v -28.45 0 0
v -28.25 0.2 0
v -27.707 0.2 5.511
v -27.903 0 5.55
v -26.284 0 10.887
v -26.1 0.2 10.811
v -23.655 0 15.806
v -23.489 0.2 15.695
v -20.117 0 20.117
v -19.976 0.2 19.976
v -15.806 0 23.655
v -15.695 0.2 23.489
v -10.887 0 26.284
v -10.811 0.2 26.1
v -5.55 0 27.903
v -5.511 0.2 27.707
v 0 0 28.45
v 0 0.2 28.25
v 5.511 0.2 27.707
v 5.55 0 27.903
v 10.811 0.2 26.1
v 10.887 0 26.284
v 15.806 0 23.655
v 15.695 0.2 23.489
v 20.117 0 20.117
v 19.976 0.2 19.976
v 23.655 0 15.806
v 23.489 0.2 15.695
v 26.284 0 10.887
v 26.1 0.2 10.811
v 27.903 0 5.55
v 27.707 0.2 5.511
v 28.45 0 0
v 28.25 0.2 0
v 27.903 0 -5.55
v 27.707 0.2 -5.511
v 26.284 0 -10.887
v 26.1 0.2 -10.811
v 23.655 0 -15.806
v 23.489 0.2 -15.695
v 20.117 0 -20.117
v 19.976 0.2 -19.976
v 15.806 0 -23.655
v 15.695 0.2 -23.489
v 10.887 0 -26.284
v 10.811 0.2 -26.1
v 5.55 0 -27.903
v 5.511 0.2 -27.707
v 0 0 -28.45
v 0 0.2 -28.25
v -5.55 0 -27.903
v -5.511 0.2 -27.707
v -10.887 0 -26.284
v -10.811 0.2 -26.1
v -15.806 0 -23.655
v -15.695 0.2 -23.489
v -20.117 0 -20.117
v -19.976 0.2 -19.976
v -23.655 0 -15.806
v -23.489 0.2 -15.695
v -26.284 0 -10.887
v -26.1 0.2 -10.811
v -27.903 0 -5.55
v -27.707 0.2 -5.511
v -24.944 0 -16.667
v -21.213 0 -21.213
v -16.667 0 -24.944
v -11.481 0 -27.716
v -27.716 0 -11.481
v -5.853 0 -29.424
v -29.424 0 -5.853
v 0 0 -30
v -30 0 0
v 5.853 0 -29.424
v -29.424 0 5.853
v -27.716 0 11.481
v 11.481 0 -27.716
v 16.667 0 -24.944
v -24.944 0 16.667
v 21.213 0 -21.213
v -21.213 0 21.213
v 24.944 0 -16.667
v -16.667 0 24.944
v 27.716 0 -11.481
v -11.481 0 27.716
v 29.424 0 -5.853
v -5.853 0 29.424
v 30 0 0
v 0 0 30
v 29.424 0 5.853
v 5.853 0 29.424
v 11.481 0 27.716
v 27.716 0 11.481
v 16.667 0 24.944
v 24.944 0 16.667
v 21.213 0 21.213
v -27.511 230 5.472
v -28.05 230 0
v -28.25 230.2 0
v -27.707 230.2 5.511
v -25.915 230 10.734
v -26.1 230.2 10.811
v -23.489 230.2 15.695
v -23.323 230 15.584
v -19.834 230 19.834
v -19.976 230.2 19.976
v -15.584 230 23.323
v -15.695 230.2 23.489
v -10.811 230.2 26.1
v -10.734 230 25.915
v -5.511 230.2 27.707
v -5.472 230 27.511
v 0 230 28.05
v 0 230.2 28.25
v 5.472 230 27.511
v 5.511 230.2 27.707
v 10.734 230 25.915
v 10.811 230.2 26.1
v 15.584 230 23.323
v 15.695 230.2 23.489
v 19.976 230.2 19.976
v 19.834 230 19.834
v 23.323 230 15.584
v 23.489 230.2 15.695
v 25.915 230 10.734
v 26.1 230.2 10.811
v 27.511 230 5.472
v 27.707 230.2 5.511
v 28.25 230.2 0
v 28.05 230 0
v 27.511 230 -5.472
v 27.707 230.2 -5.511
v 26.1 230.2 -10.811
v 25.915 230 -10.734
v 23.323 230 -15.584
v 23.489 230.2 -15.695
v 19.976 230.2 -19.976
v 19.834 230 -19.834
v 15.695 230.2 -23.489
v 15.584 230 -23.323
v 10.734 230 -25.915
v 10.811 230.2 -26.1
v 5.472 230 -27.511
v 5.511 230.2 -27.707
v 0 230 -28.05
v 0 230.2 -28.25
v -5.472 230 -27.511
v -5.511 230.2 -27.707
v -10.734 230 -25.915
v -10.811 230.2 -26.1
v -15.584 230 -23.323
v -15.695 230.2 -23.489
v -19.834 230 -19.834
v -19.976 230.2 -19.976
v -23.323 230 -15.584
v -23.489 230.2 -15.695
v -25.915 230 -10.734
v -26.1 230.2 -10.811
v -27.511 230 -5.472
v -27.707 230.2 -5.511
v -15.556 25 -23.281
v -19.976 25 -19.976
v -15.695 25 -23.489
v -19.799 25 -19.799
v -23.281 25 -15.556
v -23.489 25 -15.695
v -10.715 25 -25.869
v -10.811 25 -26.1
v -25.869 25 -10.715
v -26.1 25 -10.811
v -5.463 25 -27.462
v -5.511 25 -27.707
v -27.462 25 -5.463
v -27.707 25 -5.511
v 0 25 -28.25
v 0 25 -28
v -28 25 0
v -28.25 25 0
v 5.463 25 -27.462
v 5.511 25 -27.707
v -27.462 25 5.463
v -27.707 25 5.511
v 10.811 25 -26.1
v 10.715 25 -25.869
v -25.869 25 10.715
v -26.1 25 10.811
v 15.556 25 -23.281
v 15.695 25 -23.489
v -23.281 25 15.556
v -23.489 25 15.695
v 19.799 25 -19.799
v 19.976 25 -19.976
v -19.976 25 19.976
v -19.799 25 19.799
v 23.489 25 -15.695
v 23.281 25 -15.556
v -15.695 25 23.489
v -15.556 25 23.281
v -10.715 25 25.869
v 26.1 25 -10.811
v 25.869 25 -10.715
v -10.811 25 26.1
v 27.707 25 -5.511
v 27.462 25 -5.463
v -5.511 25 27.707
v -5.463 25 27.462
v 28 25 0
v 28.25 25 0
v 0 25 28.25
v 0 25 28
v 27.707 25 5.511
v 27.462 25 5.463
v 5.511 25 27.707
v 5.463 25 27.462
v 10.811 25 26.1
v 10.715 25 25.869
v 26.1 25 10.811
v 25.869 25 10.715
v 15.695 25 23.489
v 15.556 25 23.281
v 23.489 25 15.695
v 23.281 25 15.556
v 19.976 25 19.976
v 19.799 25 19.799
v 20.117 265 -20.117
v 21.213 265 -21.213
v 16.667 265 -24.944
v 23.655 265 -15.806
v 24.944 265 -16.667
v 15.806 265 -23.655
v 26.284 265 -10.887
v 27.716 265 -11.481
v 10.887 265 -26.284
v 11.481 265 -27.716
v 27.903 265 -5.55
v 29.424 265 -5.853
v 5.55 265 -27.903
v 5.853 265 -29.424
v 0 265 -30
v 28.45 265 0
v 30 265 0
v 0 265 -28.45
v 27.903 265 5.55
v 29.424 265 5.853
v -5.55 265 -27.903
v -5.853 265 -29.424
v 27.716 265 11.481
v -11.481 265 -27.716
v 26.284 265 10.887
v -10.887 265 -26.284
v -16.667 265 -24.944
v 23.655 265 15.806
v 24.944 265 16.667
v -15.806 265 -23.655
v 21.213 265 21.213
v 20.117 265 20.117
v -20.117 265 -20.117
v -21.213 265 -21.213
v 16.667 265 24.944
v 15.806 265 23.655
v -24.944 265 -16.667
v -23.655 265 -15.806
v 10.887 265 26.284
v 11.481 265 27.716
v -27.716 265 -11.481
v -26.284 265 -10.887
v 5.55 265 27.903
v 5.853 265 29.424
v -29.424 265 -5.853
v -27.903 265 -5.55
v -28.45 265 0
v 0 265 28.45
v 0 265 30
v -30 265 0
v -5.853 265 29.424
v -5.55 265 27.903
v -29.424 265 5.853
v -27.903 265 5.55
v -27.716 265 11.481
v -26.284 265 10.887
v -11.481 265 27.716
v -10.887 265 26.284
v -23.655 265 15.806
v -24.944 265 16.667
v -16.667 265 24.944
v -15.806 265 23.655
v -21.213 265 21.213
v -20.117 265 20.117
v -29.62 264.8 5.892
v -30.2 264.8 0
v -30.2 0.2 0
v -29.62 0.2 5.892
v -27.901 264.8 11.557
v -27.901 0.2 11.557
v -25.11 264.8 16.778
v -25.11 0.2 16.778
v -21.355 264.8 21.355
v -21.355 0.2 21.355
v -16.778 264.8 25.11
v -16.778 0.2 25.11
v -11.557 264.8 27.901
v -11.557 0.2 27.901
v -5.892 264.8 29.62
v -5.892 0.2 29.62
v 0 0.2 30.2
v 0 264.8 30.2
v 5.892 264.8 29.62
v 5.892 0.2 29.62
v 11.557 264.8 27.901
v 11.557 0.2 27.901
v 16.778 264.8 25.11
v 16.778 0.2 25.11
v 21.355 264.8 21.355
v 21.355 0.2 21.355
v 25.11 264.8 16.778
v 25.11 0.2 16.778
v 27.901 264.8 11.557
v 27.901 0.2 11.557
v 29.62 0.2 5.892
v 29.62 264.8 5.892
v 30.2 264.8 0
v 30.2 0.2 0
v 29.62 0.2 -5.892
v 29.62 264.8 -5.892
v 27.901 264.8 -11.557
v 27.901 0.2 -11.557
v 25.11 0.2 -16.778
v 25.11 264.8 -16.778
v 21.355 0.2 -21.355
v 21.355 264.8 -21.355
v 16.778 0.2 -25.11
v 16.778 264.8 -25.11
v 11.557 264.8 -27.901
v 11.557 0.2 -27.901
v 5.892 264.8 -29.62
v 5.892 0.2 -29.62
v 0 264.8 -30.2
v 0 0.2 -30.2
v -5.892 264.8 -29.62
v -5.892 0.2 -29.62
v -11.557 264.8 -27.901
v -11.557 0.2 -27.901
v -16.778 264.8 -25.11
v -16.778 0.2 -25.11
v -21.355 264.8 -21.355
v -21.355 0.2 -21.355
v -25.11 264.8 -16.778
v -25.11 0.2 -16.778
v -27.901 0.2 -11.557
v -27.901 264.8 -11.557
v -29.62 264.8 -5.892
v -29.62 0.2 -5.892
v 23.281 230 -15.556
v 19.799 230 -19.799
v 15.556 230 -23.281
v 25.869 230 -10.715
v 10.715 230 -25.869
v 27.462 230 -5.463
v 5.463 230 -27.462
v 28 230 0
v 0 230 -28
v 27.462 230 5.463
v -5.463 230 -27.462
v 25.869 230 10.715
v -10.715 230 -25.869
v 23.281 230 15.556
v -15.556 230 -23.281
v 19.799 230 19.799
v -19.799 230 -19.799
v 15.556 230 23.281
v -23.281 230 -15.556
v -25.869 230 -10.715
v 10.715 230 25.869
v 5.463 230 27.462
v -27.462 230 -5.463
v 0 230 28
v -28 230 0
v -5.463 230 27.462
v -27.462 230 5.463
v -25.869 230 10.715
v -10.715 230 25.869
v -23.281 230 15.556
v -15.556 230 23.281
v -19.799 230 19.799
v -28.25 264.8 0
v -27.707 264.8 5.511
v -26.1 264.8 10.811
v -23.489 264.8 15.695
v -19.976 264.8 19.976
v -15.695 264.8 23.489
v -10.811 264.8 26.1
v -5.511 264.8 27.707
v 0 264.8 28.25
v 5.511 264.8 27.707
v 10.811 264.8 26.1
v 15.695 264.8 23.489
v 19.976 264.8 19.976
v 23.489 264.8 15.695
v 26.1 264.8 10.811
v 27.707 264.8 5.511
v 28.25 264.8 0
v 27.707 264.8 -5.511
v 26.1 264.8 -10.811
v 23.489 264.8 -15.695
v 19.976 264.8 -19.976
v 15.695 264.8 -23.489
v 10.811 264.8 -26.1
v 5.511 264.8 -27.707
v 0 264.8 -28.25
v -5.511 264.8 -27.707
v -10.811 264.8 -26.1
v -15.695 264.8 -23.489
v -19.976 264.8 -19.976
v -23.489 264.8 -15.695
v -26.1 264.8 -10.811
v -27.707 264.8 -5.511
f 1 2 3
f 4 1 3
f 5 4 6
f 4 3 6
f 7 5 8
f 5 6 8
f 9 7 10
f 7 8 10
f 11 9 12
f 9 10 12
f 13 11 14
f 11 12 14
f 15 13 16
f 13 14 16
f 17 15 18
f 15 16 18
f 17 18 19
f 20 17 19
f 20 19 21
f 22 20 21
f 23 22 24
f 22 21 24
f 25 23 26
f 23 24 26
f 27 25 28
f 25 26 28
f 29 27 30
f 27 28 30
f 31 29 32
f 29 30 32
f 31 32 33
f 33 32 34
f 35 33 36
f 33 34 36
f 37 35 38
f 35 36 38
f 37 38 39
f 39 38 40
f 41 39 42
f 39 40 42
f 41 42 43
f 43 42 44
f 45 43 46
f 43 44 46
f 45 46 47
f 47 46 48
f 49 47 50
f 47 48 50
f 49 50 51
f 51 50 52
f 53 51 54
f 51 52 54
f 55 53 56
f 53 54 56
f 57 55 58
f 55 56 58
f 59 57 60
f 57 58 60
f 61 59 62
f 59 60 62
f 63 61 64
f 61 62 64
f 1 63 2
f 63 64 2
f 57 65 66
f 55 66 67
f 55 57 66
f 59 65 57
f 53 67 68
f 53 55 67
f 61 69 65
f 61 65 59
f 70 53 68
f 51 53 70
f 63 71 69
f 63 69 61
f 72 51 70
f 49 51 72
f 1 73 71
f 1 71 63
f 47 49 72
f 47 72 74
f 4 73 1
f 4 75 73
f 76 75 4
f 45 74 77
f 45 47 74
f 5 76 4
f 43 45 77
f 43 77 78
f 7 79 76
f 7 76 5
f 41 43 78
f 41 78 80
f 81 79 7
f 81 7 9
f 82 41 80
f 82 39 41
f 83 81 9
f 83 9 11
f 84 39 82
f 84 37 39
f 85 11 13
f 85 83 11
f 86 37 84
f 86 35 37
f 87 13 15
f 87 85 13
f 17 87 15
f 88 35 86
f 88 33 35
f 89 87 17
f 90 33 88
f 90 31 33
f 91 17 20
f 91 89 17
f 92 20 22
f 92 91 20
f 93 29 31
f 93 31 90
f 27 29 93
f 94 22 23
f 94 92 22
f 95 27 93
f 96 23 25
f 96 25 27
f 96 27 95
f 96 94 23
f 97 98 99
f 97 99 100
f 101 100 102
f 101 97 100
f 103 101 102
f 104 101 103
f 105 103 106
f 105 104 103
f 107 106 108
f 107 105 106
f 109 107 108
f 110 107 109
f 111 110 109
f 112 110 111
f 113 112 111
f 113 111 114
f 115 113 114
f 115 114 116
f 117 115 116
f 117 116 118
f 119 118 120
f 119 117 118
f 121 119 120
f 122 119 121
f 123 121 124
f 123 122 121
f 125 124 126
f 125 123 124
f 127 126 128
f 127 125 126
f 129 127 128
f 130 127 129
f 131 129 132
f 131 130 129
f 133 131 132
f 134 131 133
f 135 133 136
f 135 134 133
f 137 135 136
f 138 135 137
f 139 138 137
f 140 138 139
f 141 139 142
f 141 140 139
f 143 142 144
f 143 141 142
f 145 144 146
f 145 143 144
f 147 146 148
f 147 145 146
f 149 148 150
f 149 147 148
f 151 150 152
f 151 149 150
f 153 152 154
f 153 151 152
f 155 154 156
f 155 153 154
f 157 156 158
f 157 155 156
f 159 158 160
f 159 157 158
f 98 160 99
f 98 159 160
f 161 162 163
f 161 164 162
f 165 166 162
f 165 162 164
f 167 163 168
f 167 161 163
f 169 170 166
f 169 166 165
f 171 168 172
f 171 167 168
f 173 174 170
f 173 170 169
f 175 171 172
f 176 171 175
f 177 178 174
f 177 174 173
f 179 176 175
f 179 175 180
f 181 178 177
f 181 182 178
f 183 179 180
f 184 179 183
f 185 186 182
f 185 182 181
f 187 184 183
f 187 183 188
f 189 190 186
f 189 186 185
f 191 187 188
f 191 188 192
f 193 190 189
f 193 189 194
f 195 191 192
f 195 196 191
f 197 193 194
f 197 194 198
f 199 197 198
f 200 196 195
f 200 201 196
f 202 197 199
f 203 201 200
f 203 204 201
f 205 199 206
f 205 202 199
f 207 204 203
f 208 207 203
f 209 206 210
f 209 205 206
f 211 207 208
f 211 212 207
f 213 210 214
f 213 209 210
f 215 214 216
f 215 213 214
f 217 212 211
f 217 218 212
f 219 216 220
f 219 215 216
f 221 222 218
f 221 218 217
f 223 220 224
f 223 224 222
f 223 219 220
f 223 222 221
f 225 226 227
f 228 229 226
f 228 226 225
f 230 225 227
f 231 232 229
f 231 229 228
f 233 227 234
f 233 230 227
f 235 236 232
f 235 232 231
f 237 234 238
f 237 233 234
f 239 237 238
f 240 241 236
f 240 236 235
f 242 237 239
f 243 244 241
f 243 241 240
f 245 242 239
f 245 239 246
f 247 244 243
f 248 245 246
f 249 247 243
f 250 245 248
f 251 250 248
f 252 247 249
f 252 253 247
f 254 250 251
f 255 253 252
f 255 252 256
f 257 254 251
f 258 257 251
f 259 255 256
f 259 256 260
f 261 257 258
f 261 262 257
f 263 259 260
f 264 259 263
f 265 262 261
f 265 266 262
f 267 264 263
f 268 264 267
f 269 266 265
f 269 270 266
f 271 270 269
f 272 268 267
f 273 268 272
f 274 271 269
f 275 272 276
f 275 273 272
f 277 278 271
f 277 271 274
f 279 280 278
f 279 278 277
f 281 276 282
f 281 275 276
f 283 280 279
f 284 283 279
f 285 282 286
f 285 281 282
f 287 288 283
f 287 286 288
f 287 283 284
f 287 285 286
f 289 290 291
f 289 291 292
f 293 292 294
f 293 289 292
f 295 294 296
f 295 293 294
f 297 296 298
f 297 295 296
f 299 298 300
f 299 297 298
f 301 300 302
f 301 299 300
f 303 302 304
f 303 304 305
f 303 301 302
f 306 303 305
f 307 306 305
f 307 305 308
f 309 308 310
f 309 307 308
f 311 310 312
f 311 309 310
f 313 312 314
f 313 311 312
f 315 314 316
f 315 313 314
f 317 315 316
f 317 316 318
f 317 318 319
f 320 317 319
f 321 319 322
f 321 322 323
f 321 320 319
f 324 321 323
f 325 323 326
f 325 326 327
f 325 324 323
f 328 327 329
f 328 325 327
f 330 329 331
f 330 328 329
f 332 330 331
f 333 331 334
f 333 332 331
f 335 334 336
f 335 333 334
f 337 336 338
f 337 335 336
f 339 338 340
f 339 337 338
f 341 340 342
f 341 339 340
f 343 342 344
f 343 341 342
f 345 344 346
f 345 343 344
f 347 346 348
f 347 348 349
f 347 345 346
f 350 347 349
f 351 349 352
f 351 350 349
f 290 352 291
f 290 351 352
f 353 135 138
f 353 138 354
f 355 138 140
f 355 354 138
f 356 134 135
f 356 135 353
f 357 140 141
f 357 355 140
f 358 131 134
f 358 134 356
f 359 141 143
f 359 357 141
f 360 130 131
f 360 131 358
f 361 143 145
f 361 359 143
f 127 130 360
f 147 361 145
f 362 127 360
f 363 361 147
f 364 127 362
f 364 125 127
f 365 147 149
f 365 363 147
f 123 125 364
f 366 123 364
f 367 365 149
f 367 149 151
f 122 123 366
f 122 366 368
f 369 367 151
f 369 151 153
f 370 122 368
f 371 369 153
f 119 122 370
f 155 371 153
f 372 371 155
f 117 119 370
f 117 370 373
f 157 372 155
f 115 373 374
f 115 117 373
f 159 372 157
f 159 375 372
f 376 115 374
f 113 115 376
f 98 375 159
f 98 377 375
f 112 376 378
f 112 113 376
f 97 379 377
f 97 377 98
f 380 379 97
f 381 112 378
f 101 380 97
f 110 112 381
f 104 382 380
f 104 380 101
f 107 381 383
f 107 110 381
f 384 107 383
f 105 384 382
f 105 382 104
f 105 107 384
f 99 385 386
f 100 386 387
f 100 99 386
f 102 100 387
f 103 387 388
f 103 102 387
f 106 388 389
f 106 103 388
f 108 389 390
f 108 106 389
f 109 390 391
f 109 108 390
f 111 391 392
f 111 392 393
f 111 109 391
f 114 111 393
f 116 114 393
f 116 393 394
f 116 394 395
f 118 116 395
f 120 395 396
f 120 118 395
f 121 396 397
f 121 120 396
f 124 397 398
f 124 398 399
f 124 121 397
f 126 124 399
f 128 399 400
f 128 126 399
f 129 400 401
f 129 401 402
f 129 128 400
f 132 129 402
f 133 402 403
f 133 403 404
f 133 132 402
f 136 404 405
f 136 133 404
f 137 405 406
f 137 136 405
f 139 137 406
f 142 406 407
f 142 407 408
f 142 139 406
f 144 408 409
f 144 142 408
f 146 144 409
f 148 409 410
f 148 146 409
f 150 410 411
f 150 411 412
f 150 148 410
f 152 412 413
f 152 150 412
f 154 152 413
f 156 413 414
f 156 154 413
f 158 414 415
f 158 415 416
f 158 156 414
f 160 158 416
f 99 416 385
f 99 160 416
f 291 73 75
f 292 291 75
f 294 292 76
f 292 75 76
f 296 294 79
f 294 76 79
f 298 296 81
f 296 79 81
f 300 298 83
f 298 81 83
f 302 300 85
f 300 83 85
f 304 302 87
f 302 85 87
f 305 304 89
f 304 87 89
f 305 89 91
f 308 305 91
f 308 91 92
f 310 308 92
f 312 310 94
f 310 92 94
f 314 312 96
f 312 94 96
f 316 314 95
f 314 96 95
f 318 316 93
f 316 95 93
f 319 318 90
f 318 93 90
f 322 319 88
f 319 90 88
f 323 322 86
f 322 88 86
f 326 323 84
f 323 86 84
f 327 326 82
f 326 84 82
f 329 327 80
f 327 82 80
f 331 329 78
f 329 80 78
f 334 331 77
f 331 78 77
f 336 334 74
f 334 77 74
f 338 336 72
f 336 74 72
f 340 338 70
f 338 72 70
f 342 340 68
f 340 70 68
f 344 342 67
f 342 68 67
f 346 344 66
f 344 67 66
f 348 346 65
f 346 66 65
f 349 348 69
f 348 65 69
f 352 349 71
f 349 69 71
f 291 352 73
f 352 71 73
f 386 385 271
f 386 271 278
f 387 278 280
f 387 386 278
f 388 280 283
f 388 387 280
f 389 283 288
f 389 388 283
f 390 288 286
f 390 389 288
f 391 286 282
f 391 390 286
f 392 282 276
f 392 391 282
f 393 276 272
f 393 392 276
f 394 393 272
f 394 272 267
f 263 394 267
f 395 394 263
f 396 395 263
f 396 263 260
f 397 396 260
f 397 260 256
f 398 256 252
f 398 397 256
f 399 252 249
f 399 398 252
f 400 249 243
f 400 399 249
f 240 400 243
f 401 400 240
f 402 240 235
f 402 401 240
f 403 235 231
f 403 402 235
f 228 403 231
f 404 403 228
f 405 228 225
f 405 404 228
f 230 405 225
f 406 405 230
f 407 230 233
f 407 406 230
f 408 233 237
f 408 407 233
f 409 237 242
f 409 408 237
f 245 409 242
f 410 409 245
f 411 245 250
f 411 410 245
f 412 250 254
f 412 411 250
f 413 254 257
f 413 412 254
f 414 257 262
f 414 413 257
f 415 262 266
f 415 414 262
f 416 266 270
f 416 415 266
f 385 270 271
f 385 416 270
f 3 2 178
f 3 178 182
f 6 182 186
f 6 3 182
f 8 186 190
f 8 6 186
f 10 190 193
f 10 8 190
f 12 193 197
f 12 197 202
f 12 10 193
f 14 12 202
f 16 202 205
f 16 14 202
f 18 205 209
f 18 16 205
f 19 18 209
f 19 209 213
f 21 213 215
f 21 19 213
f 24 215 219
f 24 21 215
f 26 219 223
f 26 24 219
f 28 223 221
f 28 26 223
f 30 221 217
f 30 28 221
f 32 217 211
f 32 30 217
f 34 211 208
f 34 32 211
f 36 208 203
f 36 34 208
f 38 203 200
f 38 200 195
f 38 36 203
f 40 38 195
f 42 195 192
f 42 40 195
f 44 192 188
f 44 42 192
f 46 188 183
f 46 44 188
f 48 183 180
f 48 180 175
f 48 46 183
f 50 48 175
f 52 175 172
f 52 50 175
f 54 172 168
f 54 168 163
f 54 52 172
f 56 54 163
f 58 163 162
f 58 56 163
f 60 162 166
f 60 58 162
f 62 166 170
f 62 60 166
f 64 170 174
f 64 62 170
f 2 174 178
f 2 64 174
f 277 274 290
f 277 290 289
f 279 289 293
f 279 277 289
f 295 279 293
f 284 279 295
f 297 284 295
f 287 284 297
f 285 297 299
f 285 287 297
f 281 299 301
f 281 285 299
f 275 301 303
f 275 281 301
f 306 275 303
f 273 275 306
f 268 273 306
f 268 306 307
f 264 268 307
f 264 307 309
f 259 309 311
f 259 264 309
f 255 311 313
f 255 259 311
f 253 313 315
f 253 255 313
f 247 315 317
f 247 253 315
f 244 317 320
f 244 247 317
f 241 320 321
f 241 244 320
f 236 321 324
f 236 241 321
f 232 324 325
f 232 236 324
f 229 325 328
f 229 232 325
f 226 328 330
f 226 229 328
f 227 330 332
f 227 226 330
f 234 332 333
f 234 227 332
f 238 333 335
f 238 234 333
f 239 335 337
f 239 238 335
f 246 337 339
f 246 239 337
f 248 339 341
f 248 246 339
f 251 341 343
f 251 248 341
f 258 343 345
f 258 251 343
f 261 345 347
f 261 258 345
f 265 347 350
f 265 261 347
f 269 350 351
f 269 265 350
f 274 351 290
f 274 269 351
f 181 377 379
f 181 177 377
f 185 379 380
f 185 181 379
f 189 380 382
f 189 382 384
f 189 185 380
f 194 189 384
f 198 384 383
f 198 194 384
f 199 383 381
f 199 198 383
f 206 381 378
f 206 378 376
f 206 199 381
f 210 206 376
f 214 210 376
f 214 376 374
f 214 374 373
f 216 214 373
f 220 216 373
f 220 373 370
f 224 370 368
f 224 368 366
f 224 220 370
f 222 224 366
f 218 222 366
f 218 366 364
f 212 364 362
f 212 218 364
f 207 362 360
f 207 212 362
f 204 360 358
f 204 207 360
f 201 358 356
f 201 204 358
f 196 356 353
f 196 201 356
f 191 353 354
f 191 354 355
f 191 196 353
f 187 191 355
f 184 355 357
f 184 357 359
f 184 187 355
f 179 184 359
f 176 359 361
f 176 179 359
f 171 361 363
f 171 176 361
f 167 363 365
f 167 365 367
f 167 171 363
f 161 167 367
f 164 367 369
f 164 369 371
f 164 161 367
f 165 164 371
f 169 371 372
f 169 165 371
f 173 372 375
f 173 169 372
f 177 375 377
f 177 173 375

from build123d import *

# Parameters (mm, degrees)
CHAMFER_1_SIZE = 0.2
CHAMFER_2_SIZE = 0.2
CHAMFER_3_SIZE = 0.2
CHAMFER_4_SIZE = 0.2


with BuildPart() as part:
    # Эскиз1 → Повернуть1 (revolve)
    with BuildSketch(Plane.XY):
        Polygon((-30.2, 0), (-30.2, 264.999961118), (-28.25, 264.999961118), (-28.25, 229.999961118), (-28, 229.999961118), (-28, 25), (-28.25, 25), (-28.25, 0), align=None)
    revolve(axis=Axis((0, 0, 0), (0, 1, 0)))

    # Фаска1
    chamfer_1_edges = [part.edges().sort_by_distance(p)[0] for p in [
        (30.2, 264.999961118, 0),
    ]]
    chamfer(chamfer_1_edges, length=CHAMFER_1_SIZE)

    # Фаска2
    chamfer_2_edges = [part.edges().sort_by_distance(p)[0] for p in [
        (28.25, 264.999961118, 0),
        (28.25, 229.999961118, 0),
    ]]
    chamfer(chamfer_2_edges, length=CHAMFER_2_SIZE)

    # Фаска3
    chamfer_3_edges = [part.edges().sort_by_distance(p)[0] for p in [
        (30.2, 0, 0),
    ]]
    chamfer(chamfer_3_edges, length=CHAMFER_3_SIZE)

    # Фаска4
    chamfer_4_edges = [part.edges().sort_by_distance(p)[0] for p in [
        (28.25, 0, 0),
    ]]
    chamfer(chamfer_4_edges, length=CHAMFER_4_SIZE)


solid = part.part
